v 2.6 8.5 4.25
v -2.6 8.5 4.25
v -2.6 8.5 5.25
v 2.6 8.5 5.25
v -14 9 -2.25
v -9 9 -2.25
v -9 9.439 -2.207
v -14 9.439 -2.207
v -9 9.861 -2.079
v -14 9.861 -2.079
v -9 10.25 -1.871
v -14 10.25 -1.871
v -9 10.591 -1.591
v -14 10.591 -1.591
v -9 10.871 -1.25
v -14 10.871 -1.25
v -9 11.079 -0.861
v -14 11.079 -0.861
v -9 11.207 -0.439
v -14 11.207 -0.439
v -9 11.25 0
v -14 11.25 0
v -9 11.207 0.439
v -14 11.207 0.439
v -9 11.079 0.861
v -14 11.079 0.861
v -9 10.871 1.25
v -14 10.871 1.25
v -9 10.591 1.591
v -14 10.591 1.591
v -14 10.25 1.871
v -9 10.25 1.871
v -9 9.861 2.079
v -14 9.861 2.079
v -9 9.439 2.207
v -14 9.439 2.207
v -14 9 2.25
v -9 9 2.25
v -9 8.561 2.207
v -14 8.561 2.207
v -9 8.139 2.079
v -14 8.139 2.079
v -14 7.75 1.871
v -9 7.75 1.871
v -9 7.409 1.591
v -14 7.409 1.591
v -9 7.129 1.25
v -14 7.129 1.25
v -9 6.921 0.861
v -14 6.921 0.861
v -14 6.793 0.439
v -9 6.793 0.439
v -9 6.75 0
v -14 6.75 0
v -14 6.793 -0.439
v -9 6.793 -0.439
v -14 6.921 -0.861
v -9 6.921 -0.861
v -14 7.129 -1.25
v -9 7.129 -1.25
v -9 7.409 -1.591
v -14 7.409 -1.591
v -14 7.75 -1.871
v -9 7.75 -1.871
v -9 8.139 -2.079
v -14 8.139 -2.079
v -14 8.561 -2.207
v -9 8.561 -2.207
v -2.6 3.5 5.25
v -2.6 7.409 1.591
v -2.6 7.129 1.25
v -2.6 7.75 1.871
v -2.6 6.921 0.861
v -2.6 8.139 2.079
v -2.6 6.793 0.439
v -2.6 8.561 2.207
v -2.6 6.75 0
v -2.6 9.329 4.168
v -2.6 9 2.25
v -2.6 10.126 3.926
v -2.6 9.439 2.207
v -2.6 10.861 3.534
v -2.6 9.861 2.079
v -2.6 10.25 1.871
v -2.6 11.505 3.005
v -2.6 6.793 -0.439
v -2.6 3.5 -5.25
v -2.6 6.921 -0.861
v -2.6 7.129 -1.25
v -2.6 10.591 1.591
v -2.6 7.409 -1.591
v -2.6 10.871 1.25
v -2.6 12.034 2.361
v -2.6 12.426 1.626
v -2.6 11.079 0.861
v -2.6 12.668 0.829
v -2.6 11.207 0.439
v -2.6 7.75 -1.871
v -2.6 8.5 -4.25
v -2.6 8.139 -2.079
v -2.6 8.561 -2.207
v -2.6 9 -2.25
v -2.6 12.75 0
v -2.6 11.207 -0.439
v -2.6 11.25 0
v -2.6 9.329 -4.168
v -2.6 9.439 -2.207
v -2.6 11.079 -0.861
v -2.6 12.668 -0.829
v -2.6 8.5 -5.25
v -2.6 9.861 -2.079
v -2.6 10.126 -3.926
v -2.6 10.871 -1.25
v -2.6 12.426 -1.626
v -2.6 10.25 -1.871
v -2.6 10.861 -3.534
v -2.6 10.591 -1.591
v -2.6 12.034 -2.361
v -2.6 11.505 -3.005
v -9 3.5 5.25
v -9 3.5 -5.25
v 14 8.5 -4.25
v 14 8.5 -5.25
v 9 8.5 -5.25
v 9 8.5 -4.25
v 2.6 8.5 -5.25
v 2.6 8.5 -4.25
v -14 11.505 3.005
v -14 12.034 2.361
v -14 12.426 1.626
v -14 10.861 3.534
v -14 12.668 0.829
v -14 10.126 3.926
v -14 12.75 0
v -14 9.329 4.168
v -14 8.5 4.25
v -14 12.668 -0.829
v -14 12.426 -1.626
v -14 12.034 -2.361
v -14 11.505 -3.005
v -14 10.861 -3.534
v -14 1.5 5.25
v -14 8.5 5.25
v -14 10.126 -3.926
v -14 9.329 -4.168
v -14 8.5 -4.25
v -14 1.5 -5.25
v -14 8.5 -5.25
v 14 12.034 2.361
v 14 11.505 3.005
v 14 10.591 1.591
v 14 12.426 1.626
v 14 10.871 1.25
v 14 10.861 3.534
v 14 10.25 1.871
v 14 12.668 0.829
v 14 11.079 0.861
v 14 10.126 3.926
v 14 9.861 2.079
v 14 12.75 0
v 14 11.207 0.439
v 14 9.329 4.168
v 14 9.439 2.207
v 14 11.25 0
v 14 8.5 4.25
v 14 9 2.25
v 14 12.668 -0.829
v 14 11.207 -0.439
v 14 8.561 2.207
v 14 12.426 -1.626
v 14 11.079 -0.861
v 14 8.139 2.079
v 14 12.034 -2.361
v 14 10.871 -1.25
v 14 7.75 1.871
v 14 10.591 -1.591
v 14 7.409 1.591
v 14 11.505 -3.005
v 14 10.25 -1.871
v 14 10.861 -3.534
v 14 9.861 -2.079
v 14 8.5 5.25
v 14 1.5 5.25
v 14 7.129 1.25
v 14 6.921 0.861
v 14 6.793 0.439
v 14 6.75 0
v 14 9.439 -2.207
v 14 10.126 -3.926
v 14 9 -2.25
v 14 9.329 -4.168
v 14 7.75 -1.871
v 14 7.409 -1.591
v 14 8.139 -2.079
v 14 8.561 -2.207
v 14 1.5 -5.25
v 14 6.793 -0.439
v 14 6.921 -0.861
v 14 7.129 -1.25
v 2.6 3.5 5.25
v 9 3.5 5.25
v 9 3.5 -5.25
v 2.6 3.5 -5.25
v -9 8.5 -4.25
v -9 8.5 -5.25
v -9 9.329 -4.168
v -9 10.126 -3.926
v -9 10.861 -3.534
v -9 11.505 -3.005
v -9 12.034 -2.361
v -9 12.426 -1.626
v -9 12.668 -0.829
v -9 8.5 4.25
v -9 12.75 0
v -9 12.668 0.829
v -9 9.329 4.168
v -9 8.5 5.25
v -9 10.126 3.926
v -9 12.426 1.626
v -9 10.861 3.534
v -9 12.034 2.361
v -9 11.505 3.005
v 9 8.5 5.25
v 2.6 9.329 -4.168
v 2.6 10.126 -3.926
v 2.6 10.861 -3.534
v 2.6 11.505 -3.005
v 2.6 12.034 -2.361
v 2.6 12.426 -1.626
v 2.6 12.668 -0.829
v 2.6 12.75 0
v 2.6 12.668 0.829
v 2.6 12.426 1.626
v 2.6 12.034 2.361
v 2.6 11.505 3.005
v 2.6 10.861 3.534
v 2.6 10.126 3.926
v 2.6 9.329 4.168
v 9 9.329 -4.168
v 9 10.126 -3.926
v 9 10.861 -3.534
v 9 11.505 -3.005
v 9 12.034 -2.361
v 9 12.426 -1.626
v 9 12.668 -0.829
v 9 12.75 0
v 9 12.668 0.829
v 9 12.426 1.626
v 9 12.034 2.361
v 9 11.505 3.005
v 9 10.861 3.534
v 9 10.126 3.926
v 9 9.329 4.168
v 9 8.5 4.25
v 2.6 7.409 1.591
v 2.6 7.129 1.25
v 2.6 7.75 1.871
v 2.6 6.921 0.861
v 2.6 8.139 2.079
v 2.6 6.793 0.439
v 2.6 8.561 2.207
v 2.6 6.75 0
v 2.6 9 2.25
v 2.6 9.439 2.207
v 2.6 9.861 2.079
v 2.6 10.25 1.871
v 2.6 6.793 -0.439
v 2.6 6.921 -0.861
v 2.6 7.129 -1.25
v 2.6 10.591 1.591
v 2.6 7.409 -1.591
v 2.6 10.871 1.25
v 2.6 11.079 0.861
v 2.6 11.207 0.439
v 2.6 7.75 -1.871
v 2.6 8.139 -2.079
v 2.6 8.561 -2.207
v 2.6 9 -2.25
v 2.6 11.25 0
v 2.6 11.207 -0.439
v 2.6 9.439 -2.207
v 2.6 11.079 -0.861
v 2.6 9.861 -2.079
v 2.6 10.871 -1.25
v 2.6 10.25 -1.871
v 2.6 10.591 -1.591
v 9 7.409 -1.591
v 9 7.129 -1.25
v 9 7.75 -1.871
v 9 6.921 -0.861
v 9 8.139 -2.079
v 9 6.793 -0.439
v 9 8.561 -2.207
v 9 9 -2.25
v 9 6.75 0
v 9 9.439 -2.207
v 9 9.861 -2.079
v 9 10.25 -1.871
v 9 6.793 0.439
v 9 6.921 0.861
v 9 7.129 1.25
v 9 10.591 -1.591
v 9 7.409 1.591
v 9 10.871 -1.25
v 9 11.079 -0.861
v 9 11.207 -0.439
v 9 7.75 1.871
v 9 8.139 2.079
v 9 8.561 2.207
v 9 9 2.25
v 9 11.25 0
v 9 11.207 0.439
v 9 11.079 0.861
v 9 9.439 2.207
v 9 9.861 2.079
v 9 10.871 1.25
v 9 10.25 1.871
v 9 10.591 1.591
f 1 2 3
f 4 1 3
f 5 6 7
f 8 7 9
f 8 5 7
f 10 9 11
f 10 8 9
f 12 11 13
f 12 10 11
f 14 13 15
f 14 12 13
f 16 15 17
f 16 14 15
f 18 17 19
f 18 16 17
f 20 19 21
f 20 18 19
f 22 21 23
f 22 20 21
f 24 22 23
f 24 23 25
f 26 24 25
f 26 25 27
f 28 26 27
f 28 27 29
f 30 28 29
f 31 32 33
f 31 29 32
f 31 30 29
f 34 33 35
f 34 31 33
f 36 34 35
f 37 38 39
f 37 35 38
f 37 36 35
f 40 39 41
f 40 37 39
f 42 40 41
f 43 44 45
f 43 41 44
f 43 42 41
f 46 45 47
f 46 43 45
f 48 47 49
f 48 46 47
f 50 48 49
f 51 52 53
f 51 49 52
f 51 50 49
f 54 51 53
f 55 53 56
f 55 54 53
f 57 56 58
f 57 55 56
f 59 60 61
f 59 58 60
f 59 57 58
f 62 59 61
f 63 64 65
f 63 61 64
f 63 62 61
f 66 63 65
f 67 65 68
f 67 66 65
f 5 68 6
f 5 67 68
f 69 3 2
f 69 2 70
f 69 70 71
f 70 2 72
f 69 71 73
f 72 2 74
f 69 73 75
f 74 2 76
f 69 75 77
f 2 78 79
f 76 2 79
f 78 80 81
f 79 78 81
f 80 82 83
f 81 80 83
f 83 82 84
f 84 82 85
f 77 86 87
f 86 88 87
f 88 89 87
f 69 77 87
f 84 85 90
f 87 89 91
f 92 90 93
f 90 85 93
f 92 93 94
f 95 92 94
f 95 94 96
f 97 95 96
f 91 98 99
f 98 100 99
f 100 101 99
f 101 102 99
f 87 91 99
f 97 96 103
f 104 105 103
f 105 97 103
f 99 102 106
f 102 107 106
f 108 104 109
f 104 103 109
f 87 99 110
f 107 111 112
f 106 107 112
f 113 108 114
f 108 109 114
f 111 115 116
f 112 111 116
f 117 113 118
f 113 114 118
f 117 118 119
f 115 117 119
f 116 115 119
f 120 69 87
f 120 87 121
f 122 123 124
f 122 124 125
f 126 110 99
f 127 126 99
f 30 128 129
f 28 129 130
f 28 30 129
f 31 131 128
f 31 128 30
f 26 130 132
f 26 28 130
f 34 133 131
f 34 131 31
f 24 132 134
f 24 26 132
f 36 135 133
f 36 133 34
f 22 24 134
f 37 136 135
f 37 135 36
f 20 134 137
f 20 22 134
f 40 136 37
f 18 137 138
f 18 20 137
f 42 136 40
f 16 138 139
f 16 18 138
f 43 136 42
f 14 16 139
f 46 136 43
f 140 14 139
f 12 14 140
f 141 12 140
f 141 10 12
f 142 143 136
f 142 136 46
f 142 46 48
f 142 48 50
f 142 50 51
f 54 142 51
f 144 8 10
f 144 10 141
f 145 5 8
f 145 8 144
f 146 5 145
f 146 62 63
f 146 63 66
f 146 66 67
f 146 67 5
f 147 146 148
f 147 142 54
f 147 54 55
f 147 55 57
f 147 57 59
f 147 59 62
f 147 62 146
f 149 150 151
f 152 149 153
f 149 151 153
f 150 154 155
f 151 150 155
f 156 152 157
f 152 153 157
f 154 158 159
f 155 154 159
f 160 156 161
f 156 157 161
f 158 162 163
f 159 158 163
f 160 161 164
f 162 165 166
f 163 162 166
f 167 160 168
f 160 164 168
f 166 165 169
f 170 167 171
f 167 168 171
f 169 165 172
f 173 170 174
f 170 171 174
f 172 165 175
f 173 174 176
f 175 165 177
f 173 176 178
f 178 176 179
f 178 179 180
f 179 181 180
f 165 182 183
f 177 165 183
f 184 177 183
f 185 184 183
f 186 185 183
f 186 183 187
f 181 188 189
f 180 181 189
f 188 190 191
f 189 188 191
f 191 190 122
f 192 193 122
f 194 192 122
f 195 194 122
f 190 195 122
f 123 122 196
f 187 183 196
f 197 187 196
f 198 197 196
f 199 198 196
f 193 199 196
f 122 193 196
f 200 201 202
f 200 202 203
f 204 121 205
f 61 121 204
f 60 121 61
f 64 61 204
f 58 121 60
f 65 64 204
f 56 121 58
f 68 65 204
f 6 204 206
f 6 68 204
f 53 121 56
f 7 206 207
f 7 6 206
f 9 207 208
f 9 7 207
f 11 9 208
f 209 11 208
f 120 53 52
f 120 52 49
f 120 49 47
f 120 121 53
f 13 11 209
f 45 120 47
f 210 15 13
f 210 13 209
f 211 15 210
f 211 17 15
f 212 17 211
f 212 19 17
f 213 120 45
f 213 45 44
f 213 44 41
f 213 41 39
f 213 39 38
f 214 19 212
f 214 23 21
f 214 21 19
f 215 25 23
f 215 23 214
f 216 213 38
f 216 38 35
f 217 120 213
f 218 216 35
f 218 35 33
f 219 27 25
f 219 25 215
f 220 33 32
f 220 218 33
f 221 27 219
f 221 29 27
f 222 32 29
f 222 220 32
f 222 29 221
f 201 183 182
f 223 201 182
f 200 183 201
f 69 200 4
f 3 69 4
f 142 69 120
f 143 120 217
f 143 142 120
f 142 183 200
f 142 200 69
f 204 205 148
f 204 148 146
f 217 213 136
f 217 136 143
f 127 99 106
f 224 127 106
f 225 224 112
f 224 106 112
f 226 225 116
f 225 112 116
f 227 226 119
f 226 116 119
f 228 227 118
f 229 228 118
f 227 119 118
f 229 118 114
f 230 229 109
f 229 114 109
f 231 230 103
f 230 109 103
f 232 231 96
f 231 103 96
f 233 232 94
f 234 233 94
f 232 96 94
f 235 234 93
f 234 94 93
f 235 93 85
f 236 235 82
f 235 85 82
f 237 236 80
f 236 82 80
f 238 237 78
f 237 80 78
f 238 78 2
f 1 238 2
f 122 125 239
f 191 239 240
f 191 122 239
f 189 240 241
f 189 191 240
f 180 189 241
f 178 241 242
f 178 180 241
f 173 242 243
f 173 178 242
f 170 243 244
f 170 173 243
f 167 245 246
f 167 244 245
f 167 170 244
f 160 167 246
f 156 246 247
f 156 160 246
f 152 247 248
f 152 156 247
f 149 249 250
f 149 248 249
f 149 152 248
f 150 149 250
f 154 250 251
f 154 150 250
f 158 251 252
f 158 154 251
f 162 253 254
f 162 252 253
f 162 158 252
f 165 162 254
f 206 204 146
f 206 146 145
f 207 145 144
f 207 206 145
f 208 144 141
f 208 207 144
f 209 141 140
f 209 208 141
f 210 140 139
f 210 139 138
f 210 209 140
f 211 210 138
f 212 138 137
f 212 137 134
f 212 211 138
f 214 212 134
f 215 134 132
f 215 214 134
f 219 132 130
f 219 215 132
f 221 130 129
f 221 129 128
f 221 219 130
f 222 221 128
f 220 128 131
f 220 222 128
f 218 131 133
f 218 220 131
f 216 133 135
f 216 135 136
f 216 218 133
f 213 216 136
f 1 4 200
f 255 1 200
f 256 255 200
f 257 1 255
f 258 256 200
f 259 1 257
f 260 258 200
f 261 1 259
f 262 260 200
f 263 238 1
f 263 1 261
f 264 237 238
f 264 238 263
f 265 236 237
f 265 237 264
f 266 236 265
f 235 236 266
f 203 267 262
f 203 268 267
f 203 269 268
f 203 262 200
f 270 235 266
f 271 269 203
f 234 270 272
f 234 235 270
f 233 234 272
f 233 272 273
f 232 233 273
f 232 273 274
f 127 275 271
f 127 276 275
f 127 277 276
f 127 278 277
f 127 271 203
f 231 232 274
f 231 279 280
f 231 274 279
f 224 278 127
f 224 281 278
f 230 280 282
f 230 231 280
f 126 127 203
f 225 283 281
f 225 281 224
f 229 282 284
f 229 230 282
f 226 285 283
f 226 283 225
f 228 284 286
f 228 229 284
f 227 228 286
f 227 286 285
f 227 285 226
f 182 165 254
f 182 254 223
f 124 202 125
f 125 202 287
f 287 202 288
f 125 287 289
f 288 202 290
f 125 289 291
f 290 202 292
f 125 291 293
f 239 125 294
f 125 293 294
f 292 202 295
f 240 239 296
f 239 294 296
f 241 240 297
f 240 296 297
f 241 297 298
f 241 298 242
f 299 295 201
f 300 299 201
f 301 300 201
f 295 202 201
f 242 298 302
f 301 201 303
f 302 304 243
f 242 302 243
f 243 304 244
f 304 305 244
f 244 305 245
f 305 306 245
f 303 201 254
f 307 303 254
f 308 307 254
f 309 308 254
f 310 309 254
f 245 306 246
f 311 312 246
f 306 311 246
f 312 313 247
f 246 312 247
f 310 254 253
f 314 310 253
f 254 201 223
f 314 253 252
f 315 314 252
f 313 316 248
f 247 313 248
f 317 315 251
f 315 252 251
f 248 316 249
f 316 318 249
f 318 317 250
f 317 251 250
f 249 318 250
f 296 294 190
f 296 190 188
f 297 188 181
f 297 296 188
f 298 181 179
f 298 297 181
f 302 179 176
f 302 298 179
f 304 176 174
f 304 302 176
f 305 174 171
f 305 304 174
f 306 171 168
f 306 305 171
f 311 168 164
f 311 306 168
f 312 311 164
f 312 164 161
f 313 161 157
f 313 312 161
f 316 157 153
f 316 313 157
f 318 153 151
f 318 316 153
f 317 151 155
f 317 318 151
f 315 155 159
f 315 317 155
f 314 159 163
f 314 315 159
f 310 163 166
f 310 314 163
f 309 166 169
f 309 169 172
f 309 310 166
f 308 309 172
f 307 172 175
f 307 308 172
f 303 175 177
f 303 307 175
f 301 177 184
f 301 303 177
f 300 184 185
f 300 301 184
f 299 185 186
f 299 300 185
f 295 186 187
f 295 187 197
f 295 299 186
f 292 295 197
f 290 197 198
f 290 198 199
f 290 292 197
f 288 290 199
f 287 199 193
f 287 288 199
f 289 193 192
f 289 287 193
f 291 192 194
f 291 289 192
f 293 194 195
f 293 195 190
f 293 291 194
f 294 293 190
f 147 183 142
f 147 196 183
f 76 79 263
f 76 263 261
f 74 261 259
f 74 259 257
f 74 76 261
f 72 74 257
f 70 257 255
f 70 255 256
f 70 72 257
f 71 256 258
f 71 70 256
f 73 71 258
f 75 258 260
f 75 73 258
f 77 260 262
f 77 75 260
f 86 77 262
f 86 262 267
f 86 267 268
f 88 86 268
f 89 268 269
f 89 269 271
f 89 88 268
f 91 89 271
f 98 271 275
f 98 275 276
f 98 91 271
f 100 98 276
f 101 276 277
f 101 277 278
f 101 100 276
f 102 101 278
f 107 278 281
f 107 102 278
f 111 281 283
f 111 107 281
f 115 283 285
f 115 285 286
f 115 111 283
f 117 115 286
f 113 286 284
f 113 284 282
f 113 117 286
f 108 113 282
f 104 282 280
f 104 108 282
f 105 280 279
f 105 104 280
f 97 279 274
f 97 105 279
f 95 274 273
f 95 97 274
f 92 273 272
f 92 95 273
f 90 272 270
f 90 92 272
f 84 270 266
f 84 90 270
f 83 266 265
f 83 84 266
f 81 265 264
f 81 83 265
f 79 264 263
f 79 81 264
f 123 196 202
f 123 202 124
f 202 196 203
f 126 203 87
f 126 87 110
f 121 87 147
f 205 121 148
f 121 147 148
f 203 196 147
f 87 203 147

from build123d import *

# Parameters (mm, degrees)
SKETCH1_R                       = 2.25
BOSS_EXTRUDE1_DEPTH             = 14
SKETCH2_W                       = 18
SKETCH2_H                       = 9.25
CUT_EXTRUDE1_DEPTH              = 24.849790355
BOSS_EXTRUDE2_DEPTH             = 2.6
BOSS_EXTRUDE2_DEPTH_BACK        = 2.6
SKETCH4_R                       = 2.25
BOSS_EXTRUDE3_DEPTH             = 28
SKETCH7_W                       = 4.5
SKETCH7_H                       = 3
CUT_EXTRUDE2_DEPTH              = 36.082738034
SKETCH9_W                       = 28
SKETCH9_H                       = 2
BOSS_EXTRUDE4_DEPTH             = 48
BOSS_EXTRUDE5_REACH             = 60.209
SKETCH11_W                      = 28
SKETCH11_H                      = 7.313537016
BOSS_EXTRUDE5_DIRECTION_2_REACH = 60.209
SKETCH14_R                      = 2.15
CUT_EXTRUDE6_DEPTH              = 59.208886884
SKETCH15_W                      = 48
SKETCH15_H                      = 2
SKETCH15_W_2                    = 7.313537016
SKETCH15_H_2                    = 13.819983601
CUT_EXTRUDE7_DEPTH              = 64.806460469
SKETCH16_W                      = 2
SKETCH16_H                      = 7
CUT_EXTRUDE8_DEPTH              = 32.608938609


with BuildPart() as part:
    # Sketch1 → Boss-Extrude1 (new, symmetric)
    with BuildSketch(Plane(origin=(0, 0, 0), x_dir=(0, 0, -1), z_dir=(1, 0, 0))):
        with BuildLine():
            Line((2.25, 1.5), (7.25, 1.5))
            Line((7.25, 1.5), (7.25, 8.5))
            Line((7.25, 8.5), (4.25, 8.5))
            ThreePointArc((4.25, 8.5), (0, 12.75), (-4.25, 8.5))
            Line((-4.25, 8.5), (-7.25, 8.5))
            Line((-7.25, 8.5), (-7.25, 1.5))
            Line((-7.25, 1.5), (-2.25, 1.5))
            Line((-2.25, 1.5), (-2.25, -1.5))
            Line((-2.25, -1.5), (2.25, -1.5))
            Line((2.25, -1.5), (2.25, 1.5))
        make_face()
        with Locations((0, 9)):
            Circle(SKETCH1_R, mode=Mode.SUBTRACT)
    extrude(amount=BOSS_EXTRUDE1_DEPTH, both=True)

    # Sketch2 → Cut-Extrude1 (cut, through all)
    with BuildSketch(Plane.XY.offset(7.25)):
        with Locations((0, 8.125)):
            Rectangle(SKETCH2_W, SKETCH2_H)
    extrude(amount=-CUT_EXTRUDE1_DEPTH, mode=Mode.SUBTRACT)

    # Sketch4 → Boss-Extrude2 (add, two sides: drawn at the far end of the back side and taken through both)
    with BuildSketch(Plane(origin=(0, 0, 0), x_dir=(0, 0, -1), z_dir=(1, 0, 0)).offset(-BOSS_EXTRUDE2_DEPTH_BACK)):
        with BuildLine():
            Line((-4.25, 8.5), (-7.25, 8.5))
            Line((-7.25, 8.5), (-7.25, 3.5))
            Line((-7.25, 3.5), (7.25, 3.5))
            Line((7.25, 3.5), (7.25, 8.5))
            Line((7.25, 8.5), (4.25, 8.5))
            ThreePointArc((4.25, 8.5), (0, 12.75), (-4.25, 8.5))
        make_face()
        with Locations(Location((0, 9, 0), (0, 0, 180))):
            Circle(SKETCH4_R, mode=Mode.SUBTRACT)
    extrude(amount=BOSS_EXTRUDE2_DEPTH + BOSS_EXTRUDE2_DEPTH_BACK)

    # Sketch6 → Boss-Extrude3 (add, through all)
    with BuildSketch(Plane.ZY.offset(14)):
        Polygon((7.25, 8.5), (14.563537016, 15.319983601), (14.563537016, 8.319983601), (7.25, 1.5), align=None)
    extrude(amount=-BOSS_EXTRUDE3_DEPTH)

    # Sketch7 → Cut-Extrude2 (cut, through all)
    with BuildSketch(Plane.ZY.offset(14)):
        Rectangle(SKETCH7_W, SKETCH7_H)
    extrude(amount=-CUT_EXTRUDE2_DEPTH, mode=Mode.SUBTRACT)

    # Sketch9 → Boss-Extrude4 (add)
    with BuildSketch(Plane(origin=(0, 0, -7.25), x_dir=(-1, 0, 0), z_dir=(0, 0, -1))):
        with Locations((0, 2.5)):
            Rectangle(SKETCH9_W, SKETCH9_H)
    extrude(amount=BOSS_EXTRUDE4_DEPTH)

    # Boss-Extrude5: up to this face of the body (flat: up to its plane)
    boss_extrude5_end = Plane(part.part.faces().sort_by_distance((0, 1.5, -24))[0])
    # Sketch11 → Boss-Extrude5 (add, up to the picked face)
    with BuildSketch(Plane(origin=(0, 3.5, 0), x_dir=(1, 0, 0), z_dir=(0, 1, 0)), mode=Mode.PRIVATE) as boss_extrude5_sk1:
        with Locations((0, -10.906768508)):
            Rectangle(SKETCH11_W, SKETCH11_H)
    boss_extrude5_tool1 = split(extrude(boss_extrude5_sk1.sketch, amount=-BOSS_EXTRUDE5_REACH, mode=Mode.PRIVATE), bisect_by=boss_extrude5_end, keep=Keep.BOTH, mode=Mode.PRIVATE)
    add(boss_extrude5_tool1.solids().sort_by(Axis((0, 3.5, 10.906769), (0, -1, 0)))[0])

    # Boss-Extrude5 direction 2: up to this face of the body (flat: up to its plane)
    boss_extrude5_direction_2_end = Plane(part.part.faces().sort_by_distance((0, 4.9099918, 10.906768508))[0])
    # Sketch11 → Boss-Extrude5 direction 2 (add, up to the picked face)
    with BuildSketch(Plane(origin=(0, 3.5, 0), x_dir=(1, 0, 0), z_dir=(0, 1, 0)), mode=Mode.PRIVATE) as boss_extrude5_direction_2_sk1:
        with Locations((0, -10.906768508)):
            Rectangle(SKETCH11_W, SKETCH11_H)
    boss_extrude5_direction_2_tool1 = split(extrude(boss_extrude5_direction_2_sk1.sketch, amount=BOSS_EXTRUDE5_DIRECTION_2_REACH, mode=Mode.PRIVATE), bisect_by=boss_extrude5_direction_2_end, keep=Keep.BOTH, mode=Mode.PRIVATE)
    add(boss_extrude5_direction_2_tool1.solids().sort_by(Axis((0, 3.5, 10.906769), (0, 1, 0)))[0])

    # Sketch14 → Cut-Extrude6 (cut, through all)
    with BuildSketch(Plane(origin=(0, 3.5, 0), x_dir=(1, 0, 0), z_dir=(0, 1, 0))):
        with Locations(Location((11, 51, 0), (0, 0, 270))):
            Circle(SKETCH14_R)
        with Locations(Location((11, 29, 0), (0, 0, 270))):
            Circle(SKETCH14_R)
        with Locations(Location((-11, 29, 0), (0, 0, 270))):
            Circle(SKETCH14_R)
        with Locations(Location((-11, 51, 0), (0, 0, 270))):
            Circle(SKETCH14_R)
    extrude(amount=-CUT_EXTRUDE6_DEPTH, mode=Mode.SUBTRACT)

    # Sketch15 → Cut-Extrude7 (cut, through all)
    with BuildSketch(Plane.ZY.offset(14)):
        with Locations((-31.25, 2.5)):
            Rectangle(SKETCH15_W, SKETCH15_H)
        with Locations((10.906768508, 8.409991801)):
            Rectangle(SKETCH15_W_2, SKETCH15_H_2)
    extrude(amount=-CUT_EXTRUDE7_DEPTH, mode=Mode.SUBTRACT)

    # Sketch16 → Cut-Extrude8 (cut, through all)
    with BuildSketch(Plane.ZY.offset(14)):
        with Locations((-6.25, 5)):
            Rectangle(SKETCH16_W, SKETCH16_H)
        with Locations((6.25, 5)):
            Rectangle(SKETCH16_W, SKETCH16_H)
    extrude(amount=-CUT_EXTRUDE8_DEPTH, mode=Mode.SUBTRACT)


solid = part.part
